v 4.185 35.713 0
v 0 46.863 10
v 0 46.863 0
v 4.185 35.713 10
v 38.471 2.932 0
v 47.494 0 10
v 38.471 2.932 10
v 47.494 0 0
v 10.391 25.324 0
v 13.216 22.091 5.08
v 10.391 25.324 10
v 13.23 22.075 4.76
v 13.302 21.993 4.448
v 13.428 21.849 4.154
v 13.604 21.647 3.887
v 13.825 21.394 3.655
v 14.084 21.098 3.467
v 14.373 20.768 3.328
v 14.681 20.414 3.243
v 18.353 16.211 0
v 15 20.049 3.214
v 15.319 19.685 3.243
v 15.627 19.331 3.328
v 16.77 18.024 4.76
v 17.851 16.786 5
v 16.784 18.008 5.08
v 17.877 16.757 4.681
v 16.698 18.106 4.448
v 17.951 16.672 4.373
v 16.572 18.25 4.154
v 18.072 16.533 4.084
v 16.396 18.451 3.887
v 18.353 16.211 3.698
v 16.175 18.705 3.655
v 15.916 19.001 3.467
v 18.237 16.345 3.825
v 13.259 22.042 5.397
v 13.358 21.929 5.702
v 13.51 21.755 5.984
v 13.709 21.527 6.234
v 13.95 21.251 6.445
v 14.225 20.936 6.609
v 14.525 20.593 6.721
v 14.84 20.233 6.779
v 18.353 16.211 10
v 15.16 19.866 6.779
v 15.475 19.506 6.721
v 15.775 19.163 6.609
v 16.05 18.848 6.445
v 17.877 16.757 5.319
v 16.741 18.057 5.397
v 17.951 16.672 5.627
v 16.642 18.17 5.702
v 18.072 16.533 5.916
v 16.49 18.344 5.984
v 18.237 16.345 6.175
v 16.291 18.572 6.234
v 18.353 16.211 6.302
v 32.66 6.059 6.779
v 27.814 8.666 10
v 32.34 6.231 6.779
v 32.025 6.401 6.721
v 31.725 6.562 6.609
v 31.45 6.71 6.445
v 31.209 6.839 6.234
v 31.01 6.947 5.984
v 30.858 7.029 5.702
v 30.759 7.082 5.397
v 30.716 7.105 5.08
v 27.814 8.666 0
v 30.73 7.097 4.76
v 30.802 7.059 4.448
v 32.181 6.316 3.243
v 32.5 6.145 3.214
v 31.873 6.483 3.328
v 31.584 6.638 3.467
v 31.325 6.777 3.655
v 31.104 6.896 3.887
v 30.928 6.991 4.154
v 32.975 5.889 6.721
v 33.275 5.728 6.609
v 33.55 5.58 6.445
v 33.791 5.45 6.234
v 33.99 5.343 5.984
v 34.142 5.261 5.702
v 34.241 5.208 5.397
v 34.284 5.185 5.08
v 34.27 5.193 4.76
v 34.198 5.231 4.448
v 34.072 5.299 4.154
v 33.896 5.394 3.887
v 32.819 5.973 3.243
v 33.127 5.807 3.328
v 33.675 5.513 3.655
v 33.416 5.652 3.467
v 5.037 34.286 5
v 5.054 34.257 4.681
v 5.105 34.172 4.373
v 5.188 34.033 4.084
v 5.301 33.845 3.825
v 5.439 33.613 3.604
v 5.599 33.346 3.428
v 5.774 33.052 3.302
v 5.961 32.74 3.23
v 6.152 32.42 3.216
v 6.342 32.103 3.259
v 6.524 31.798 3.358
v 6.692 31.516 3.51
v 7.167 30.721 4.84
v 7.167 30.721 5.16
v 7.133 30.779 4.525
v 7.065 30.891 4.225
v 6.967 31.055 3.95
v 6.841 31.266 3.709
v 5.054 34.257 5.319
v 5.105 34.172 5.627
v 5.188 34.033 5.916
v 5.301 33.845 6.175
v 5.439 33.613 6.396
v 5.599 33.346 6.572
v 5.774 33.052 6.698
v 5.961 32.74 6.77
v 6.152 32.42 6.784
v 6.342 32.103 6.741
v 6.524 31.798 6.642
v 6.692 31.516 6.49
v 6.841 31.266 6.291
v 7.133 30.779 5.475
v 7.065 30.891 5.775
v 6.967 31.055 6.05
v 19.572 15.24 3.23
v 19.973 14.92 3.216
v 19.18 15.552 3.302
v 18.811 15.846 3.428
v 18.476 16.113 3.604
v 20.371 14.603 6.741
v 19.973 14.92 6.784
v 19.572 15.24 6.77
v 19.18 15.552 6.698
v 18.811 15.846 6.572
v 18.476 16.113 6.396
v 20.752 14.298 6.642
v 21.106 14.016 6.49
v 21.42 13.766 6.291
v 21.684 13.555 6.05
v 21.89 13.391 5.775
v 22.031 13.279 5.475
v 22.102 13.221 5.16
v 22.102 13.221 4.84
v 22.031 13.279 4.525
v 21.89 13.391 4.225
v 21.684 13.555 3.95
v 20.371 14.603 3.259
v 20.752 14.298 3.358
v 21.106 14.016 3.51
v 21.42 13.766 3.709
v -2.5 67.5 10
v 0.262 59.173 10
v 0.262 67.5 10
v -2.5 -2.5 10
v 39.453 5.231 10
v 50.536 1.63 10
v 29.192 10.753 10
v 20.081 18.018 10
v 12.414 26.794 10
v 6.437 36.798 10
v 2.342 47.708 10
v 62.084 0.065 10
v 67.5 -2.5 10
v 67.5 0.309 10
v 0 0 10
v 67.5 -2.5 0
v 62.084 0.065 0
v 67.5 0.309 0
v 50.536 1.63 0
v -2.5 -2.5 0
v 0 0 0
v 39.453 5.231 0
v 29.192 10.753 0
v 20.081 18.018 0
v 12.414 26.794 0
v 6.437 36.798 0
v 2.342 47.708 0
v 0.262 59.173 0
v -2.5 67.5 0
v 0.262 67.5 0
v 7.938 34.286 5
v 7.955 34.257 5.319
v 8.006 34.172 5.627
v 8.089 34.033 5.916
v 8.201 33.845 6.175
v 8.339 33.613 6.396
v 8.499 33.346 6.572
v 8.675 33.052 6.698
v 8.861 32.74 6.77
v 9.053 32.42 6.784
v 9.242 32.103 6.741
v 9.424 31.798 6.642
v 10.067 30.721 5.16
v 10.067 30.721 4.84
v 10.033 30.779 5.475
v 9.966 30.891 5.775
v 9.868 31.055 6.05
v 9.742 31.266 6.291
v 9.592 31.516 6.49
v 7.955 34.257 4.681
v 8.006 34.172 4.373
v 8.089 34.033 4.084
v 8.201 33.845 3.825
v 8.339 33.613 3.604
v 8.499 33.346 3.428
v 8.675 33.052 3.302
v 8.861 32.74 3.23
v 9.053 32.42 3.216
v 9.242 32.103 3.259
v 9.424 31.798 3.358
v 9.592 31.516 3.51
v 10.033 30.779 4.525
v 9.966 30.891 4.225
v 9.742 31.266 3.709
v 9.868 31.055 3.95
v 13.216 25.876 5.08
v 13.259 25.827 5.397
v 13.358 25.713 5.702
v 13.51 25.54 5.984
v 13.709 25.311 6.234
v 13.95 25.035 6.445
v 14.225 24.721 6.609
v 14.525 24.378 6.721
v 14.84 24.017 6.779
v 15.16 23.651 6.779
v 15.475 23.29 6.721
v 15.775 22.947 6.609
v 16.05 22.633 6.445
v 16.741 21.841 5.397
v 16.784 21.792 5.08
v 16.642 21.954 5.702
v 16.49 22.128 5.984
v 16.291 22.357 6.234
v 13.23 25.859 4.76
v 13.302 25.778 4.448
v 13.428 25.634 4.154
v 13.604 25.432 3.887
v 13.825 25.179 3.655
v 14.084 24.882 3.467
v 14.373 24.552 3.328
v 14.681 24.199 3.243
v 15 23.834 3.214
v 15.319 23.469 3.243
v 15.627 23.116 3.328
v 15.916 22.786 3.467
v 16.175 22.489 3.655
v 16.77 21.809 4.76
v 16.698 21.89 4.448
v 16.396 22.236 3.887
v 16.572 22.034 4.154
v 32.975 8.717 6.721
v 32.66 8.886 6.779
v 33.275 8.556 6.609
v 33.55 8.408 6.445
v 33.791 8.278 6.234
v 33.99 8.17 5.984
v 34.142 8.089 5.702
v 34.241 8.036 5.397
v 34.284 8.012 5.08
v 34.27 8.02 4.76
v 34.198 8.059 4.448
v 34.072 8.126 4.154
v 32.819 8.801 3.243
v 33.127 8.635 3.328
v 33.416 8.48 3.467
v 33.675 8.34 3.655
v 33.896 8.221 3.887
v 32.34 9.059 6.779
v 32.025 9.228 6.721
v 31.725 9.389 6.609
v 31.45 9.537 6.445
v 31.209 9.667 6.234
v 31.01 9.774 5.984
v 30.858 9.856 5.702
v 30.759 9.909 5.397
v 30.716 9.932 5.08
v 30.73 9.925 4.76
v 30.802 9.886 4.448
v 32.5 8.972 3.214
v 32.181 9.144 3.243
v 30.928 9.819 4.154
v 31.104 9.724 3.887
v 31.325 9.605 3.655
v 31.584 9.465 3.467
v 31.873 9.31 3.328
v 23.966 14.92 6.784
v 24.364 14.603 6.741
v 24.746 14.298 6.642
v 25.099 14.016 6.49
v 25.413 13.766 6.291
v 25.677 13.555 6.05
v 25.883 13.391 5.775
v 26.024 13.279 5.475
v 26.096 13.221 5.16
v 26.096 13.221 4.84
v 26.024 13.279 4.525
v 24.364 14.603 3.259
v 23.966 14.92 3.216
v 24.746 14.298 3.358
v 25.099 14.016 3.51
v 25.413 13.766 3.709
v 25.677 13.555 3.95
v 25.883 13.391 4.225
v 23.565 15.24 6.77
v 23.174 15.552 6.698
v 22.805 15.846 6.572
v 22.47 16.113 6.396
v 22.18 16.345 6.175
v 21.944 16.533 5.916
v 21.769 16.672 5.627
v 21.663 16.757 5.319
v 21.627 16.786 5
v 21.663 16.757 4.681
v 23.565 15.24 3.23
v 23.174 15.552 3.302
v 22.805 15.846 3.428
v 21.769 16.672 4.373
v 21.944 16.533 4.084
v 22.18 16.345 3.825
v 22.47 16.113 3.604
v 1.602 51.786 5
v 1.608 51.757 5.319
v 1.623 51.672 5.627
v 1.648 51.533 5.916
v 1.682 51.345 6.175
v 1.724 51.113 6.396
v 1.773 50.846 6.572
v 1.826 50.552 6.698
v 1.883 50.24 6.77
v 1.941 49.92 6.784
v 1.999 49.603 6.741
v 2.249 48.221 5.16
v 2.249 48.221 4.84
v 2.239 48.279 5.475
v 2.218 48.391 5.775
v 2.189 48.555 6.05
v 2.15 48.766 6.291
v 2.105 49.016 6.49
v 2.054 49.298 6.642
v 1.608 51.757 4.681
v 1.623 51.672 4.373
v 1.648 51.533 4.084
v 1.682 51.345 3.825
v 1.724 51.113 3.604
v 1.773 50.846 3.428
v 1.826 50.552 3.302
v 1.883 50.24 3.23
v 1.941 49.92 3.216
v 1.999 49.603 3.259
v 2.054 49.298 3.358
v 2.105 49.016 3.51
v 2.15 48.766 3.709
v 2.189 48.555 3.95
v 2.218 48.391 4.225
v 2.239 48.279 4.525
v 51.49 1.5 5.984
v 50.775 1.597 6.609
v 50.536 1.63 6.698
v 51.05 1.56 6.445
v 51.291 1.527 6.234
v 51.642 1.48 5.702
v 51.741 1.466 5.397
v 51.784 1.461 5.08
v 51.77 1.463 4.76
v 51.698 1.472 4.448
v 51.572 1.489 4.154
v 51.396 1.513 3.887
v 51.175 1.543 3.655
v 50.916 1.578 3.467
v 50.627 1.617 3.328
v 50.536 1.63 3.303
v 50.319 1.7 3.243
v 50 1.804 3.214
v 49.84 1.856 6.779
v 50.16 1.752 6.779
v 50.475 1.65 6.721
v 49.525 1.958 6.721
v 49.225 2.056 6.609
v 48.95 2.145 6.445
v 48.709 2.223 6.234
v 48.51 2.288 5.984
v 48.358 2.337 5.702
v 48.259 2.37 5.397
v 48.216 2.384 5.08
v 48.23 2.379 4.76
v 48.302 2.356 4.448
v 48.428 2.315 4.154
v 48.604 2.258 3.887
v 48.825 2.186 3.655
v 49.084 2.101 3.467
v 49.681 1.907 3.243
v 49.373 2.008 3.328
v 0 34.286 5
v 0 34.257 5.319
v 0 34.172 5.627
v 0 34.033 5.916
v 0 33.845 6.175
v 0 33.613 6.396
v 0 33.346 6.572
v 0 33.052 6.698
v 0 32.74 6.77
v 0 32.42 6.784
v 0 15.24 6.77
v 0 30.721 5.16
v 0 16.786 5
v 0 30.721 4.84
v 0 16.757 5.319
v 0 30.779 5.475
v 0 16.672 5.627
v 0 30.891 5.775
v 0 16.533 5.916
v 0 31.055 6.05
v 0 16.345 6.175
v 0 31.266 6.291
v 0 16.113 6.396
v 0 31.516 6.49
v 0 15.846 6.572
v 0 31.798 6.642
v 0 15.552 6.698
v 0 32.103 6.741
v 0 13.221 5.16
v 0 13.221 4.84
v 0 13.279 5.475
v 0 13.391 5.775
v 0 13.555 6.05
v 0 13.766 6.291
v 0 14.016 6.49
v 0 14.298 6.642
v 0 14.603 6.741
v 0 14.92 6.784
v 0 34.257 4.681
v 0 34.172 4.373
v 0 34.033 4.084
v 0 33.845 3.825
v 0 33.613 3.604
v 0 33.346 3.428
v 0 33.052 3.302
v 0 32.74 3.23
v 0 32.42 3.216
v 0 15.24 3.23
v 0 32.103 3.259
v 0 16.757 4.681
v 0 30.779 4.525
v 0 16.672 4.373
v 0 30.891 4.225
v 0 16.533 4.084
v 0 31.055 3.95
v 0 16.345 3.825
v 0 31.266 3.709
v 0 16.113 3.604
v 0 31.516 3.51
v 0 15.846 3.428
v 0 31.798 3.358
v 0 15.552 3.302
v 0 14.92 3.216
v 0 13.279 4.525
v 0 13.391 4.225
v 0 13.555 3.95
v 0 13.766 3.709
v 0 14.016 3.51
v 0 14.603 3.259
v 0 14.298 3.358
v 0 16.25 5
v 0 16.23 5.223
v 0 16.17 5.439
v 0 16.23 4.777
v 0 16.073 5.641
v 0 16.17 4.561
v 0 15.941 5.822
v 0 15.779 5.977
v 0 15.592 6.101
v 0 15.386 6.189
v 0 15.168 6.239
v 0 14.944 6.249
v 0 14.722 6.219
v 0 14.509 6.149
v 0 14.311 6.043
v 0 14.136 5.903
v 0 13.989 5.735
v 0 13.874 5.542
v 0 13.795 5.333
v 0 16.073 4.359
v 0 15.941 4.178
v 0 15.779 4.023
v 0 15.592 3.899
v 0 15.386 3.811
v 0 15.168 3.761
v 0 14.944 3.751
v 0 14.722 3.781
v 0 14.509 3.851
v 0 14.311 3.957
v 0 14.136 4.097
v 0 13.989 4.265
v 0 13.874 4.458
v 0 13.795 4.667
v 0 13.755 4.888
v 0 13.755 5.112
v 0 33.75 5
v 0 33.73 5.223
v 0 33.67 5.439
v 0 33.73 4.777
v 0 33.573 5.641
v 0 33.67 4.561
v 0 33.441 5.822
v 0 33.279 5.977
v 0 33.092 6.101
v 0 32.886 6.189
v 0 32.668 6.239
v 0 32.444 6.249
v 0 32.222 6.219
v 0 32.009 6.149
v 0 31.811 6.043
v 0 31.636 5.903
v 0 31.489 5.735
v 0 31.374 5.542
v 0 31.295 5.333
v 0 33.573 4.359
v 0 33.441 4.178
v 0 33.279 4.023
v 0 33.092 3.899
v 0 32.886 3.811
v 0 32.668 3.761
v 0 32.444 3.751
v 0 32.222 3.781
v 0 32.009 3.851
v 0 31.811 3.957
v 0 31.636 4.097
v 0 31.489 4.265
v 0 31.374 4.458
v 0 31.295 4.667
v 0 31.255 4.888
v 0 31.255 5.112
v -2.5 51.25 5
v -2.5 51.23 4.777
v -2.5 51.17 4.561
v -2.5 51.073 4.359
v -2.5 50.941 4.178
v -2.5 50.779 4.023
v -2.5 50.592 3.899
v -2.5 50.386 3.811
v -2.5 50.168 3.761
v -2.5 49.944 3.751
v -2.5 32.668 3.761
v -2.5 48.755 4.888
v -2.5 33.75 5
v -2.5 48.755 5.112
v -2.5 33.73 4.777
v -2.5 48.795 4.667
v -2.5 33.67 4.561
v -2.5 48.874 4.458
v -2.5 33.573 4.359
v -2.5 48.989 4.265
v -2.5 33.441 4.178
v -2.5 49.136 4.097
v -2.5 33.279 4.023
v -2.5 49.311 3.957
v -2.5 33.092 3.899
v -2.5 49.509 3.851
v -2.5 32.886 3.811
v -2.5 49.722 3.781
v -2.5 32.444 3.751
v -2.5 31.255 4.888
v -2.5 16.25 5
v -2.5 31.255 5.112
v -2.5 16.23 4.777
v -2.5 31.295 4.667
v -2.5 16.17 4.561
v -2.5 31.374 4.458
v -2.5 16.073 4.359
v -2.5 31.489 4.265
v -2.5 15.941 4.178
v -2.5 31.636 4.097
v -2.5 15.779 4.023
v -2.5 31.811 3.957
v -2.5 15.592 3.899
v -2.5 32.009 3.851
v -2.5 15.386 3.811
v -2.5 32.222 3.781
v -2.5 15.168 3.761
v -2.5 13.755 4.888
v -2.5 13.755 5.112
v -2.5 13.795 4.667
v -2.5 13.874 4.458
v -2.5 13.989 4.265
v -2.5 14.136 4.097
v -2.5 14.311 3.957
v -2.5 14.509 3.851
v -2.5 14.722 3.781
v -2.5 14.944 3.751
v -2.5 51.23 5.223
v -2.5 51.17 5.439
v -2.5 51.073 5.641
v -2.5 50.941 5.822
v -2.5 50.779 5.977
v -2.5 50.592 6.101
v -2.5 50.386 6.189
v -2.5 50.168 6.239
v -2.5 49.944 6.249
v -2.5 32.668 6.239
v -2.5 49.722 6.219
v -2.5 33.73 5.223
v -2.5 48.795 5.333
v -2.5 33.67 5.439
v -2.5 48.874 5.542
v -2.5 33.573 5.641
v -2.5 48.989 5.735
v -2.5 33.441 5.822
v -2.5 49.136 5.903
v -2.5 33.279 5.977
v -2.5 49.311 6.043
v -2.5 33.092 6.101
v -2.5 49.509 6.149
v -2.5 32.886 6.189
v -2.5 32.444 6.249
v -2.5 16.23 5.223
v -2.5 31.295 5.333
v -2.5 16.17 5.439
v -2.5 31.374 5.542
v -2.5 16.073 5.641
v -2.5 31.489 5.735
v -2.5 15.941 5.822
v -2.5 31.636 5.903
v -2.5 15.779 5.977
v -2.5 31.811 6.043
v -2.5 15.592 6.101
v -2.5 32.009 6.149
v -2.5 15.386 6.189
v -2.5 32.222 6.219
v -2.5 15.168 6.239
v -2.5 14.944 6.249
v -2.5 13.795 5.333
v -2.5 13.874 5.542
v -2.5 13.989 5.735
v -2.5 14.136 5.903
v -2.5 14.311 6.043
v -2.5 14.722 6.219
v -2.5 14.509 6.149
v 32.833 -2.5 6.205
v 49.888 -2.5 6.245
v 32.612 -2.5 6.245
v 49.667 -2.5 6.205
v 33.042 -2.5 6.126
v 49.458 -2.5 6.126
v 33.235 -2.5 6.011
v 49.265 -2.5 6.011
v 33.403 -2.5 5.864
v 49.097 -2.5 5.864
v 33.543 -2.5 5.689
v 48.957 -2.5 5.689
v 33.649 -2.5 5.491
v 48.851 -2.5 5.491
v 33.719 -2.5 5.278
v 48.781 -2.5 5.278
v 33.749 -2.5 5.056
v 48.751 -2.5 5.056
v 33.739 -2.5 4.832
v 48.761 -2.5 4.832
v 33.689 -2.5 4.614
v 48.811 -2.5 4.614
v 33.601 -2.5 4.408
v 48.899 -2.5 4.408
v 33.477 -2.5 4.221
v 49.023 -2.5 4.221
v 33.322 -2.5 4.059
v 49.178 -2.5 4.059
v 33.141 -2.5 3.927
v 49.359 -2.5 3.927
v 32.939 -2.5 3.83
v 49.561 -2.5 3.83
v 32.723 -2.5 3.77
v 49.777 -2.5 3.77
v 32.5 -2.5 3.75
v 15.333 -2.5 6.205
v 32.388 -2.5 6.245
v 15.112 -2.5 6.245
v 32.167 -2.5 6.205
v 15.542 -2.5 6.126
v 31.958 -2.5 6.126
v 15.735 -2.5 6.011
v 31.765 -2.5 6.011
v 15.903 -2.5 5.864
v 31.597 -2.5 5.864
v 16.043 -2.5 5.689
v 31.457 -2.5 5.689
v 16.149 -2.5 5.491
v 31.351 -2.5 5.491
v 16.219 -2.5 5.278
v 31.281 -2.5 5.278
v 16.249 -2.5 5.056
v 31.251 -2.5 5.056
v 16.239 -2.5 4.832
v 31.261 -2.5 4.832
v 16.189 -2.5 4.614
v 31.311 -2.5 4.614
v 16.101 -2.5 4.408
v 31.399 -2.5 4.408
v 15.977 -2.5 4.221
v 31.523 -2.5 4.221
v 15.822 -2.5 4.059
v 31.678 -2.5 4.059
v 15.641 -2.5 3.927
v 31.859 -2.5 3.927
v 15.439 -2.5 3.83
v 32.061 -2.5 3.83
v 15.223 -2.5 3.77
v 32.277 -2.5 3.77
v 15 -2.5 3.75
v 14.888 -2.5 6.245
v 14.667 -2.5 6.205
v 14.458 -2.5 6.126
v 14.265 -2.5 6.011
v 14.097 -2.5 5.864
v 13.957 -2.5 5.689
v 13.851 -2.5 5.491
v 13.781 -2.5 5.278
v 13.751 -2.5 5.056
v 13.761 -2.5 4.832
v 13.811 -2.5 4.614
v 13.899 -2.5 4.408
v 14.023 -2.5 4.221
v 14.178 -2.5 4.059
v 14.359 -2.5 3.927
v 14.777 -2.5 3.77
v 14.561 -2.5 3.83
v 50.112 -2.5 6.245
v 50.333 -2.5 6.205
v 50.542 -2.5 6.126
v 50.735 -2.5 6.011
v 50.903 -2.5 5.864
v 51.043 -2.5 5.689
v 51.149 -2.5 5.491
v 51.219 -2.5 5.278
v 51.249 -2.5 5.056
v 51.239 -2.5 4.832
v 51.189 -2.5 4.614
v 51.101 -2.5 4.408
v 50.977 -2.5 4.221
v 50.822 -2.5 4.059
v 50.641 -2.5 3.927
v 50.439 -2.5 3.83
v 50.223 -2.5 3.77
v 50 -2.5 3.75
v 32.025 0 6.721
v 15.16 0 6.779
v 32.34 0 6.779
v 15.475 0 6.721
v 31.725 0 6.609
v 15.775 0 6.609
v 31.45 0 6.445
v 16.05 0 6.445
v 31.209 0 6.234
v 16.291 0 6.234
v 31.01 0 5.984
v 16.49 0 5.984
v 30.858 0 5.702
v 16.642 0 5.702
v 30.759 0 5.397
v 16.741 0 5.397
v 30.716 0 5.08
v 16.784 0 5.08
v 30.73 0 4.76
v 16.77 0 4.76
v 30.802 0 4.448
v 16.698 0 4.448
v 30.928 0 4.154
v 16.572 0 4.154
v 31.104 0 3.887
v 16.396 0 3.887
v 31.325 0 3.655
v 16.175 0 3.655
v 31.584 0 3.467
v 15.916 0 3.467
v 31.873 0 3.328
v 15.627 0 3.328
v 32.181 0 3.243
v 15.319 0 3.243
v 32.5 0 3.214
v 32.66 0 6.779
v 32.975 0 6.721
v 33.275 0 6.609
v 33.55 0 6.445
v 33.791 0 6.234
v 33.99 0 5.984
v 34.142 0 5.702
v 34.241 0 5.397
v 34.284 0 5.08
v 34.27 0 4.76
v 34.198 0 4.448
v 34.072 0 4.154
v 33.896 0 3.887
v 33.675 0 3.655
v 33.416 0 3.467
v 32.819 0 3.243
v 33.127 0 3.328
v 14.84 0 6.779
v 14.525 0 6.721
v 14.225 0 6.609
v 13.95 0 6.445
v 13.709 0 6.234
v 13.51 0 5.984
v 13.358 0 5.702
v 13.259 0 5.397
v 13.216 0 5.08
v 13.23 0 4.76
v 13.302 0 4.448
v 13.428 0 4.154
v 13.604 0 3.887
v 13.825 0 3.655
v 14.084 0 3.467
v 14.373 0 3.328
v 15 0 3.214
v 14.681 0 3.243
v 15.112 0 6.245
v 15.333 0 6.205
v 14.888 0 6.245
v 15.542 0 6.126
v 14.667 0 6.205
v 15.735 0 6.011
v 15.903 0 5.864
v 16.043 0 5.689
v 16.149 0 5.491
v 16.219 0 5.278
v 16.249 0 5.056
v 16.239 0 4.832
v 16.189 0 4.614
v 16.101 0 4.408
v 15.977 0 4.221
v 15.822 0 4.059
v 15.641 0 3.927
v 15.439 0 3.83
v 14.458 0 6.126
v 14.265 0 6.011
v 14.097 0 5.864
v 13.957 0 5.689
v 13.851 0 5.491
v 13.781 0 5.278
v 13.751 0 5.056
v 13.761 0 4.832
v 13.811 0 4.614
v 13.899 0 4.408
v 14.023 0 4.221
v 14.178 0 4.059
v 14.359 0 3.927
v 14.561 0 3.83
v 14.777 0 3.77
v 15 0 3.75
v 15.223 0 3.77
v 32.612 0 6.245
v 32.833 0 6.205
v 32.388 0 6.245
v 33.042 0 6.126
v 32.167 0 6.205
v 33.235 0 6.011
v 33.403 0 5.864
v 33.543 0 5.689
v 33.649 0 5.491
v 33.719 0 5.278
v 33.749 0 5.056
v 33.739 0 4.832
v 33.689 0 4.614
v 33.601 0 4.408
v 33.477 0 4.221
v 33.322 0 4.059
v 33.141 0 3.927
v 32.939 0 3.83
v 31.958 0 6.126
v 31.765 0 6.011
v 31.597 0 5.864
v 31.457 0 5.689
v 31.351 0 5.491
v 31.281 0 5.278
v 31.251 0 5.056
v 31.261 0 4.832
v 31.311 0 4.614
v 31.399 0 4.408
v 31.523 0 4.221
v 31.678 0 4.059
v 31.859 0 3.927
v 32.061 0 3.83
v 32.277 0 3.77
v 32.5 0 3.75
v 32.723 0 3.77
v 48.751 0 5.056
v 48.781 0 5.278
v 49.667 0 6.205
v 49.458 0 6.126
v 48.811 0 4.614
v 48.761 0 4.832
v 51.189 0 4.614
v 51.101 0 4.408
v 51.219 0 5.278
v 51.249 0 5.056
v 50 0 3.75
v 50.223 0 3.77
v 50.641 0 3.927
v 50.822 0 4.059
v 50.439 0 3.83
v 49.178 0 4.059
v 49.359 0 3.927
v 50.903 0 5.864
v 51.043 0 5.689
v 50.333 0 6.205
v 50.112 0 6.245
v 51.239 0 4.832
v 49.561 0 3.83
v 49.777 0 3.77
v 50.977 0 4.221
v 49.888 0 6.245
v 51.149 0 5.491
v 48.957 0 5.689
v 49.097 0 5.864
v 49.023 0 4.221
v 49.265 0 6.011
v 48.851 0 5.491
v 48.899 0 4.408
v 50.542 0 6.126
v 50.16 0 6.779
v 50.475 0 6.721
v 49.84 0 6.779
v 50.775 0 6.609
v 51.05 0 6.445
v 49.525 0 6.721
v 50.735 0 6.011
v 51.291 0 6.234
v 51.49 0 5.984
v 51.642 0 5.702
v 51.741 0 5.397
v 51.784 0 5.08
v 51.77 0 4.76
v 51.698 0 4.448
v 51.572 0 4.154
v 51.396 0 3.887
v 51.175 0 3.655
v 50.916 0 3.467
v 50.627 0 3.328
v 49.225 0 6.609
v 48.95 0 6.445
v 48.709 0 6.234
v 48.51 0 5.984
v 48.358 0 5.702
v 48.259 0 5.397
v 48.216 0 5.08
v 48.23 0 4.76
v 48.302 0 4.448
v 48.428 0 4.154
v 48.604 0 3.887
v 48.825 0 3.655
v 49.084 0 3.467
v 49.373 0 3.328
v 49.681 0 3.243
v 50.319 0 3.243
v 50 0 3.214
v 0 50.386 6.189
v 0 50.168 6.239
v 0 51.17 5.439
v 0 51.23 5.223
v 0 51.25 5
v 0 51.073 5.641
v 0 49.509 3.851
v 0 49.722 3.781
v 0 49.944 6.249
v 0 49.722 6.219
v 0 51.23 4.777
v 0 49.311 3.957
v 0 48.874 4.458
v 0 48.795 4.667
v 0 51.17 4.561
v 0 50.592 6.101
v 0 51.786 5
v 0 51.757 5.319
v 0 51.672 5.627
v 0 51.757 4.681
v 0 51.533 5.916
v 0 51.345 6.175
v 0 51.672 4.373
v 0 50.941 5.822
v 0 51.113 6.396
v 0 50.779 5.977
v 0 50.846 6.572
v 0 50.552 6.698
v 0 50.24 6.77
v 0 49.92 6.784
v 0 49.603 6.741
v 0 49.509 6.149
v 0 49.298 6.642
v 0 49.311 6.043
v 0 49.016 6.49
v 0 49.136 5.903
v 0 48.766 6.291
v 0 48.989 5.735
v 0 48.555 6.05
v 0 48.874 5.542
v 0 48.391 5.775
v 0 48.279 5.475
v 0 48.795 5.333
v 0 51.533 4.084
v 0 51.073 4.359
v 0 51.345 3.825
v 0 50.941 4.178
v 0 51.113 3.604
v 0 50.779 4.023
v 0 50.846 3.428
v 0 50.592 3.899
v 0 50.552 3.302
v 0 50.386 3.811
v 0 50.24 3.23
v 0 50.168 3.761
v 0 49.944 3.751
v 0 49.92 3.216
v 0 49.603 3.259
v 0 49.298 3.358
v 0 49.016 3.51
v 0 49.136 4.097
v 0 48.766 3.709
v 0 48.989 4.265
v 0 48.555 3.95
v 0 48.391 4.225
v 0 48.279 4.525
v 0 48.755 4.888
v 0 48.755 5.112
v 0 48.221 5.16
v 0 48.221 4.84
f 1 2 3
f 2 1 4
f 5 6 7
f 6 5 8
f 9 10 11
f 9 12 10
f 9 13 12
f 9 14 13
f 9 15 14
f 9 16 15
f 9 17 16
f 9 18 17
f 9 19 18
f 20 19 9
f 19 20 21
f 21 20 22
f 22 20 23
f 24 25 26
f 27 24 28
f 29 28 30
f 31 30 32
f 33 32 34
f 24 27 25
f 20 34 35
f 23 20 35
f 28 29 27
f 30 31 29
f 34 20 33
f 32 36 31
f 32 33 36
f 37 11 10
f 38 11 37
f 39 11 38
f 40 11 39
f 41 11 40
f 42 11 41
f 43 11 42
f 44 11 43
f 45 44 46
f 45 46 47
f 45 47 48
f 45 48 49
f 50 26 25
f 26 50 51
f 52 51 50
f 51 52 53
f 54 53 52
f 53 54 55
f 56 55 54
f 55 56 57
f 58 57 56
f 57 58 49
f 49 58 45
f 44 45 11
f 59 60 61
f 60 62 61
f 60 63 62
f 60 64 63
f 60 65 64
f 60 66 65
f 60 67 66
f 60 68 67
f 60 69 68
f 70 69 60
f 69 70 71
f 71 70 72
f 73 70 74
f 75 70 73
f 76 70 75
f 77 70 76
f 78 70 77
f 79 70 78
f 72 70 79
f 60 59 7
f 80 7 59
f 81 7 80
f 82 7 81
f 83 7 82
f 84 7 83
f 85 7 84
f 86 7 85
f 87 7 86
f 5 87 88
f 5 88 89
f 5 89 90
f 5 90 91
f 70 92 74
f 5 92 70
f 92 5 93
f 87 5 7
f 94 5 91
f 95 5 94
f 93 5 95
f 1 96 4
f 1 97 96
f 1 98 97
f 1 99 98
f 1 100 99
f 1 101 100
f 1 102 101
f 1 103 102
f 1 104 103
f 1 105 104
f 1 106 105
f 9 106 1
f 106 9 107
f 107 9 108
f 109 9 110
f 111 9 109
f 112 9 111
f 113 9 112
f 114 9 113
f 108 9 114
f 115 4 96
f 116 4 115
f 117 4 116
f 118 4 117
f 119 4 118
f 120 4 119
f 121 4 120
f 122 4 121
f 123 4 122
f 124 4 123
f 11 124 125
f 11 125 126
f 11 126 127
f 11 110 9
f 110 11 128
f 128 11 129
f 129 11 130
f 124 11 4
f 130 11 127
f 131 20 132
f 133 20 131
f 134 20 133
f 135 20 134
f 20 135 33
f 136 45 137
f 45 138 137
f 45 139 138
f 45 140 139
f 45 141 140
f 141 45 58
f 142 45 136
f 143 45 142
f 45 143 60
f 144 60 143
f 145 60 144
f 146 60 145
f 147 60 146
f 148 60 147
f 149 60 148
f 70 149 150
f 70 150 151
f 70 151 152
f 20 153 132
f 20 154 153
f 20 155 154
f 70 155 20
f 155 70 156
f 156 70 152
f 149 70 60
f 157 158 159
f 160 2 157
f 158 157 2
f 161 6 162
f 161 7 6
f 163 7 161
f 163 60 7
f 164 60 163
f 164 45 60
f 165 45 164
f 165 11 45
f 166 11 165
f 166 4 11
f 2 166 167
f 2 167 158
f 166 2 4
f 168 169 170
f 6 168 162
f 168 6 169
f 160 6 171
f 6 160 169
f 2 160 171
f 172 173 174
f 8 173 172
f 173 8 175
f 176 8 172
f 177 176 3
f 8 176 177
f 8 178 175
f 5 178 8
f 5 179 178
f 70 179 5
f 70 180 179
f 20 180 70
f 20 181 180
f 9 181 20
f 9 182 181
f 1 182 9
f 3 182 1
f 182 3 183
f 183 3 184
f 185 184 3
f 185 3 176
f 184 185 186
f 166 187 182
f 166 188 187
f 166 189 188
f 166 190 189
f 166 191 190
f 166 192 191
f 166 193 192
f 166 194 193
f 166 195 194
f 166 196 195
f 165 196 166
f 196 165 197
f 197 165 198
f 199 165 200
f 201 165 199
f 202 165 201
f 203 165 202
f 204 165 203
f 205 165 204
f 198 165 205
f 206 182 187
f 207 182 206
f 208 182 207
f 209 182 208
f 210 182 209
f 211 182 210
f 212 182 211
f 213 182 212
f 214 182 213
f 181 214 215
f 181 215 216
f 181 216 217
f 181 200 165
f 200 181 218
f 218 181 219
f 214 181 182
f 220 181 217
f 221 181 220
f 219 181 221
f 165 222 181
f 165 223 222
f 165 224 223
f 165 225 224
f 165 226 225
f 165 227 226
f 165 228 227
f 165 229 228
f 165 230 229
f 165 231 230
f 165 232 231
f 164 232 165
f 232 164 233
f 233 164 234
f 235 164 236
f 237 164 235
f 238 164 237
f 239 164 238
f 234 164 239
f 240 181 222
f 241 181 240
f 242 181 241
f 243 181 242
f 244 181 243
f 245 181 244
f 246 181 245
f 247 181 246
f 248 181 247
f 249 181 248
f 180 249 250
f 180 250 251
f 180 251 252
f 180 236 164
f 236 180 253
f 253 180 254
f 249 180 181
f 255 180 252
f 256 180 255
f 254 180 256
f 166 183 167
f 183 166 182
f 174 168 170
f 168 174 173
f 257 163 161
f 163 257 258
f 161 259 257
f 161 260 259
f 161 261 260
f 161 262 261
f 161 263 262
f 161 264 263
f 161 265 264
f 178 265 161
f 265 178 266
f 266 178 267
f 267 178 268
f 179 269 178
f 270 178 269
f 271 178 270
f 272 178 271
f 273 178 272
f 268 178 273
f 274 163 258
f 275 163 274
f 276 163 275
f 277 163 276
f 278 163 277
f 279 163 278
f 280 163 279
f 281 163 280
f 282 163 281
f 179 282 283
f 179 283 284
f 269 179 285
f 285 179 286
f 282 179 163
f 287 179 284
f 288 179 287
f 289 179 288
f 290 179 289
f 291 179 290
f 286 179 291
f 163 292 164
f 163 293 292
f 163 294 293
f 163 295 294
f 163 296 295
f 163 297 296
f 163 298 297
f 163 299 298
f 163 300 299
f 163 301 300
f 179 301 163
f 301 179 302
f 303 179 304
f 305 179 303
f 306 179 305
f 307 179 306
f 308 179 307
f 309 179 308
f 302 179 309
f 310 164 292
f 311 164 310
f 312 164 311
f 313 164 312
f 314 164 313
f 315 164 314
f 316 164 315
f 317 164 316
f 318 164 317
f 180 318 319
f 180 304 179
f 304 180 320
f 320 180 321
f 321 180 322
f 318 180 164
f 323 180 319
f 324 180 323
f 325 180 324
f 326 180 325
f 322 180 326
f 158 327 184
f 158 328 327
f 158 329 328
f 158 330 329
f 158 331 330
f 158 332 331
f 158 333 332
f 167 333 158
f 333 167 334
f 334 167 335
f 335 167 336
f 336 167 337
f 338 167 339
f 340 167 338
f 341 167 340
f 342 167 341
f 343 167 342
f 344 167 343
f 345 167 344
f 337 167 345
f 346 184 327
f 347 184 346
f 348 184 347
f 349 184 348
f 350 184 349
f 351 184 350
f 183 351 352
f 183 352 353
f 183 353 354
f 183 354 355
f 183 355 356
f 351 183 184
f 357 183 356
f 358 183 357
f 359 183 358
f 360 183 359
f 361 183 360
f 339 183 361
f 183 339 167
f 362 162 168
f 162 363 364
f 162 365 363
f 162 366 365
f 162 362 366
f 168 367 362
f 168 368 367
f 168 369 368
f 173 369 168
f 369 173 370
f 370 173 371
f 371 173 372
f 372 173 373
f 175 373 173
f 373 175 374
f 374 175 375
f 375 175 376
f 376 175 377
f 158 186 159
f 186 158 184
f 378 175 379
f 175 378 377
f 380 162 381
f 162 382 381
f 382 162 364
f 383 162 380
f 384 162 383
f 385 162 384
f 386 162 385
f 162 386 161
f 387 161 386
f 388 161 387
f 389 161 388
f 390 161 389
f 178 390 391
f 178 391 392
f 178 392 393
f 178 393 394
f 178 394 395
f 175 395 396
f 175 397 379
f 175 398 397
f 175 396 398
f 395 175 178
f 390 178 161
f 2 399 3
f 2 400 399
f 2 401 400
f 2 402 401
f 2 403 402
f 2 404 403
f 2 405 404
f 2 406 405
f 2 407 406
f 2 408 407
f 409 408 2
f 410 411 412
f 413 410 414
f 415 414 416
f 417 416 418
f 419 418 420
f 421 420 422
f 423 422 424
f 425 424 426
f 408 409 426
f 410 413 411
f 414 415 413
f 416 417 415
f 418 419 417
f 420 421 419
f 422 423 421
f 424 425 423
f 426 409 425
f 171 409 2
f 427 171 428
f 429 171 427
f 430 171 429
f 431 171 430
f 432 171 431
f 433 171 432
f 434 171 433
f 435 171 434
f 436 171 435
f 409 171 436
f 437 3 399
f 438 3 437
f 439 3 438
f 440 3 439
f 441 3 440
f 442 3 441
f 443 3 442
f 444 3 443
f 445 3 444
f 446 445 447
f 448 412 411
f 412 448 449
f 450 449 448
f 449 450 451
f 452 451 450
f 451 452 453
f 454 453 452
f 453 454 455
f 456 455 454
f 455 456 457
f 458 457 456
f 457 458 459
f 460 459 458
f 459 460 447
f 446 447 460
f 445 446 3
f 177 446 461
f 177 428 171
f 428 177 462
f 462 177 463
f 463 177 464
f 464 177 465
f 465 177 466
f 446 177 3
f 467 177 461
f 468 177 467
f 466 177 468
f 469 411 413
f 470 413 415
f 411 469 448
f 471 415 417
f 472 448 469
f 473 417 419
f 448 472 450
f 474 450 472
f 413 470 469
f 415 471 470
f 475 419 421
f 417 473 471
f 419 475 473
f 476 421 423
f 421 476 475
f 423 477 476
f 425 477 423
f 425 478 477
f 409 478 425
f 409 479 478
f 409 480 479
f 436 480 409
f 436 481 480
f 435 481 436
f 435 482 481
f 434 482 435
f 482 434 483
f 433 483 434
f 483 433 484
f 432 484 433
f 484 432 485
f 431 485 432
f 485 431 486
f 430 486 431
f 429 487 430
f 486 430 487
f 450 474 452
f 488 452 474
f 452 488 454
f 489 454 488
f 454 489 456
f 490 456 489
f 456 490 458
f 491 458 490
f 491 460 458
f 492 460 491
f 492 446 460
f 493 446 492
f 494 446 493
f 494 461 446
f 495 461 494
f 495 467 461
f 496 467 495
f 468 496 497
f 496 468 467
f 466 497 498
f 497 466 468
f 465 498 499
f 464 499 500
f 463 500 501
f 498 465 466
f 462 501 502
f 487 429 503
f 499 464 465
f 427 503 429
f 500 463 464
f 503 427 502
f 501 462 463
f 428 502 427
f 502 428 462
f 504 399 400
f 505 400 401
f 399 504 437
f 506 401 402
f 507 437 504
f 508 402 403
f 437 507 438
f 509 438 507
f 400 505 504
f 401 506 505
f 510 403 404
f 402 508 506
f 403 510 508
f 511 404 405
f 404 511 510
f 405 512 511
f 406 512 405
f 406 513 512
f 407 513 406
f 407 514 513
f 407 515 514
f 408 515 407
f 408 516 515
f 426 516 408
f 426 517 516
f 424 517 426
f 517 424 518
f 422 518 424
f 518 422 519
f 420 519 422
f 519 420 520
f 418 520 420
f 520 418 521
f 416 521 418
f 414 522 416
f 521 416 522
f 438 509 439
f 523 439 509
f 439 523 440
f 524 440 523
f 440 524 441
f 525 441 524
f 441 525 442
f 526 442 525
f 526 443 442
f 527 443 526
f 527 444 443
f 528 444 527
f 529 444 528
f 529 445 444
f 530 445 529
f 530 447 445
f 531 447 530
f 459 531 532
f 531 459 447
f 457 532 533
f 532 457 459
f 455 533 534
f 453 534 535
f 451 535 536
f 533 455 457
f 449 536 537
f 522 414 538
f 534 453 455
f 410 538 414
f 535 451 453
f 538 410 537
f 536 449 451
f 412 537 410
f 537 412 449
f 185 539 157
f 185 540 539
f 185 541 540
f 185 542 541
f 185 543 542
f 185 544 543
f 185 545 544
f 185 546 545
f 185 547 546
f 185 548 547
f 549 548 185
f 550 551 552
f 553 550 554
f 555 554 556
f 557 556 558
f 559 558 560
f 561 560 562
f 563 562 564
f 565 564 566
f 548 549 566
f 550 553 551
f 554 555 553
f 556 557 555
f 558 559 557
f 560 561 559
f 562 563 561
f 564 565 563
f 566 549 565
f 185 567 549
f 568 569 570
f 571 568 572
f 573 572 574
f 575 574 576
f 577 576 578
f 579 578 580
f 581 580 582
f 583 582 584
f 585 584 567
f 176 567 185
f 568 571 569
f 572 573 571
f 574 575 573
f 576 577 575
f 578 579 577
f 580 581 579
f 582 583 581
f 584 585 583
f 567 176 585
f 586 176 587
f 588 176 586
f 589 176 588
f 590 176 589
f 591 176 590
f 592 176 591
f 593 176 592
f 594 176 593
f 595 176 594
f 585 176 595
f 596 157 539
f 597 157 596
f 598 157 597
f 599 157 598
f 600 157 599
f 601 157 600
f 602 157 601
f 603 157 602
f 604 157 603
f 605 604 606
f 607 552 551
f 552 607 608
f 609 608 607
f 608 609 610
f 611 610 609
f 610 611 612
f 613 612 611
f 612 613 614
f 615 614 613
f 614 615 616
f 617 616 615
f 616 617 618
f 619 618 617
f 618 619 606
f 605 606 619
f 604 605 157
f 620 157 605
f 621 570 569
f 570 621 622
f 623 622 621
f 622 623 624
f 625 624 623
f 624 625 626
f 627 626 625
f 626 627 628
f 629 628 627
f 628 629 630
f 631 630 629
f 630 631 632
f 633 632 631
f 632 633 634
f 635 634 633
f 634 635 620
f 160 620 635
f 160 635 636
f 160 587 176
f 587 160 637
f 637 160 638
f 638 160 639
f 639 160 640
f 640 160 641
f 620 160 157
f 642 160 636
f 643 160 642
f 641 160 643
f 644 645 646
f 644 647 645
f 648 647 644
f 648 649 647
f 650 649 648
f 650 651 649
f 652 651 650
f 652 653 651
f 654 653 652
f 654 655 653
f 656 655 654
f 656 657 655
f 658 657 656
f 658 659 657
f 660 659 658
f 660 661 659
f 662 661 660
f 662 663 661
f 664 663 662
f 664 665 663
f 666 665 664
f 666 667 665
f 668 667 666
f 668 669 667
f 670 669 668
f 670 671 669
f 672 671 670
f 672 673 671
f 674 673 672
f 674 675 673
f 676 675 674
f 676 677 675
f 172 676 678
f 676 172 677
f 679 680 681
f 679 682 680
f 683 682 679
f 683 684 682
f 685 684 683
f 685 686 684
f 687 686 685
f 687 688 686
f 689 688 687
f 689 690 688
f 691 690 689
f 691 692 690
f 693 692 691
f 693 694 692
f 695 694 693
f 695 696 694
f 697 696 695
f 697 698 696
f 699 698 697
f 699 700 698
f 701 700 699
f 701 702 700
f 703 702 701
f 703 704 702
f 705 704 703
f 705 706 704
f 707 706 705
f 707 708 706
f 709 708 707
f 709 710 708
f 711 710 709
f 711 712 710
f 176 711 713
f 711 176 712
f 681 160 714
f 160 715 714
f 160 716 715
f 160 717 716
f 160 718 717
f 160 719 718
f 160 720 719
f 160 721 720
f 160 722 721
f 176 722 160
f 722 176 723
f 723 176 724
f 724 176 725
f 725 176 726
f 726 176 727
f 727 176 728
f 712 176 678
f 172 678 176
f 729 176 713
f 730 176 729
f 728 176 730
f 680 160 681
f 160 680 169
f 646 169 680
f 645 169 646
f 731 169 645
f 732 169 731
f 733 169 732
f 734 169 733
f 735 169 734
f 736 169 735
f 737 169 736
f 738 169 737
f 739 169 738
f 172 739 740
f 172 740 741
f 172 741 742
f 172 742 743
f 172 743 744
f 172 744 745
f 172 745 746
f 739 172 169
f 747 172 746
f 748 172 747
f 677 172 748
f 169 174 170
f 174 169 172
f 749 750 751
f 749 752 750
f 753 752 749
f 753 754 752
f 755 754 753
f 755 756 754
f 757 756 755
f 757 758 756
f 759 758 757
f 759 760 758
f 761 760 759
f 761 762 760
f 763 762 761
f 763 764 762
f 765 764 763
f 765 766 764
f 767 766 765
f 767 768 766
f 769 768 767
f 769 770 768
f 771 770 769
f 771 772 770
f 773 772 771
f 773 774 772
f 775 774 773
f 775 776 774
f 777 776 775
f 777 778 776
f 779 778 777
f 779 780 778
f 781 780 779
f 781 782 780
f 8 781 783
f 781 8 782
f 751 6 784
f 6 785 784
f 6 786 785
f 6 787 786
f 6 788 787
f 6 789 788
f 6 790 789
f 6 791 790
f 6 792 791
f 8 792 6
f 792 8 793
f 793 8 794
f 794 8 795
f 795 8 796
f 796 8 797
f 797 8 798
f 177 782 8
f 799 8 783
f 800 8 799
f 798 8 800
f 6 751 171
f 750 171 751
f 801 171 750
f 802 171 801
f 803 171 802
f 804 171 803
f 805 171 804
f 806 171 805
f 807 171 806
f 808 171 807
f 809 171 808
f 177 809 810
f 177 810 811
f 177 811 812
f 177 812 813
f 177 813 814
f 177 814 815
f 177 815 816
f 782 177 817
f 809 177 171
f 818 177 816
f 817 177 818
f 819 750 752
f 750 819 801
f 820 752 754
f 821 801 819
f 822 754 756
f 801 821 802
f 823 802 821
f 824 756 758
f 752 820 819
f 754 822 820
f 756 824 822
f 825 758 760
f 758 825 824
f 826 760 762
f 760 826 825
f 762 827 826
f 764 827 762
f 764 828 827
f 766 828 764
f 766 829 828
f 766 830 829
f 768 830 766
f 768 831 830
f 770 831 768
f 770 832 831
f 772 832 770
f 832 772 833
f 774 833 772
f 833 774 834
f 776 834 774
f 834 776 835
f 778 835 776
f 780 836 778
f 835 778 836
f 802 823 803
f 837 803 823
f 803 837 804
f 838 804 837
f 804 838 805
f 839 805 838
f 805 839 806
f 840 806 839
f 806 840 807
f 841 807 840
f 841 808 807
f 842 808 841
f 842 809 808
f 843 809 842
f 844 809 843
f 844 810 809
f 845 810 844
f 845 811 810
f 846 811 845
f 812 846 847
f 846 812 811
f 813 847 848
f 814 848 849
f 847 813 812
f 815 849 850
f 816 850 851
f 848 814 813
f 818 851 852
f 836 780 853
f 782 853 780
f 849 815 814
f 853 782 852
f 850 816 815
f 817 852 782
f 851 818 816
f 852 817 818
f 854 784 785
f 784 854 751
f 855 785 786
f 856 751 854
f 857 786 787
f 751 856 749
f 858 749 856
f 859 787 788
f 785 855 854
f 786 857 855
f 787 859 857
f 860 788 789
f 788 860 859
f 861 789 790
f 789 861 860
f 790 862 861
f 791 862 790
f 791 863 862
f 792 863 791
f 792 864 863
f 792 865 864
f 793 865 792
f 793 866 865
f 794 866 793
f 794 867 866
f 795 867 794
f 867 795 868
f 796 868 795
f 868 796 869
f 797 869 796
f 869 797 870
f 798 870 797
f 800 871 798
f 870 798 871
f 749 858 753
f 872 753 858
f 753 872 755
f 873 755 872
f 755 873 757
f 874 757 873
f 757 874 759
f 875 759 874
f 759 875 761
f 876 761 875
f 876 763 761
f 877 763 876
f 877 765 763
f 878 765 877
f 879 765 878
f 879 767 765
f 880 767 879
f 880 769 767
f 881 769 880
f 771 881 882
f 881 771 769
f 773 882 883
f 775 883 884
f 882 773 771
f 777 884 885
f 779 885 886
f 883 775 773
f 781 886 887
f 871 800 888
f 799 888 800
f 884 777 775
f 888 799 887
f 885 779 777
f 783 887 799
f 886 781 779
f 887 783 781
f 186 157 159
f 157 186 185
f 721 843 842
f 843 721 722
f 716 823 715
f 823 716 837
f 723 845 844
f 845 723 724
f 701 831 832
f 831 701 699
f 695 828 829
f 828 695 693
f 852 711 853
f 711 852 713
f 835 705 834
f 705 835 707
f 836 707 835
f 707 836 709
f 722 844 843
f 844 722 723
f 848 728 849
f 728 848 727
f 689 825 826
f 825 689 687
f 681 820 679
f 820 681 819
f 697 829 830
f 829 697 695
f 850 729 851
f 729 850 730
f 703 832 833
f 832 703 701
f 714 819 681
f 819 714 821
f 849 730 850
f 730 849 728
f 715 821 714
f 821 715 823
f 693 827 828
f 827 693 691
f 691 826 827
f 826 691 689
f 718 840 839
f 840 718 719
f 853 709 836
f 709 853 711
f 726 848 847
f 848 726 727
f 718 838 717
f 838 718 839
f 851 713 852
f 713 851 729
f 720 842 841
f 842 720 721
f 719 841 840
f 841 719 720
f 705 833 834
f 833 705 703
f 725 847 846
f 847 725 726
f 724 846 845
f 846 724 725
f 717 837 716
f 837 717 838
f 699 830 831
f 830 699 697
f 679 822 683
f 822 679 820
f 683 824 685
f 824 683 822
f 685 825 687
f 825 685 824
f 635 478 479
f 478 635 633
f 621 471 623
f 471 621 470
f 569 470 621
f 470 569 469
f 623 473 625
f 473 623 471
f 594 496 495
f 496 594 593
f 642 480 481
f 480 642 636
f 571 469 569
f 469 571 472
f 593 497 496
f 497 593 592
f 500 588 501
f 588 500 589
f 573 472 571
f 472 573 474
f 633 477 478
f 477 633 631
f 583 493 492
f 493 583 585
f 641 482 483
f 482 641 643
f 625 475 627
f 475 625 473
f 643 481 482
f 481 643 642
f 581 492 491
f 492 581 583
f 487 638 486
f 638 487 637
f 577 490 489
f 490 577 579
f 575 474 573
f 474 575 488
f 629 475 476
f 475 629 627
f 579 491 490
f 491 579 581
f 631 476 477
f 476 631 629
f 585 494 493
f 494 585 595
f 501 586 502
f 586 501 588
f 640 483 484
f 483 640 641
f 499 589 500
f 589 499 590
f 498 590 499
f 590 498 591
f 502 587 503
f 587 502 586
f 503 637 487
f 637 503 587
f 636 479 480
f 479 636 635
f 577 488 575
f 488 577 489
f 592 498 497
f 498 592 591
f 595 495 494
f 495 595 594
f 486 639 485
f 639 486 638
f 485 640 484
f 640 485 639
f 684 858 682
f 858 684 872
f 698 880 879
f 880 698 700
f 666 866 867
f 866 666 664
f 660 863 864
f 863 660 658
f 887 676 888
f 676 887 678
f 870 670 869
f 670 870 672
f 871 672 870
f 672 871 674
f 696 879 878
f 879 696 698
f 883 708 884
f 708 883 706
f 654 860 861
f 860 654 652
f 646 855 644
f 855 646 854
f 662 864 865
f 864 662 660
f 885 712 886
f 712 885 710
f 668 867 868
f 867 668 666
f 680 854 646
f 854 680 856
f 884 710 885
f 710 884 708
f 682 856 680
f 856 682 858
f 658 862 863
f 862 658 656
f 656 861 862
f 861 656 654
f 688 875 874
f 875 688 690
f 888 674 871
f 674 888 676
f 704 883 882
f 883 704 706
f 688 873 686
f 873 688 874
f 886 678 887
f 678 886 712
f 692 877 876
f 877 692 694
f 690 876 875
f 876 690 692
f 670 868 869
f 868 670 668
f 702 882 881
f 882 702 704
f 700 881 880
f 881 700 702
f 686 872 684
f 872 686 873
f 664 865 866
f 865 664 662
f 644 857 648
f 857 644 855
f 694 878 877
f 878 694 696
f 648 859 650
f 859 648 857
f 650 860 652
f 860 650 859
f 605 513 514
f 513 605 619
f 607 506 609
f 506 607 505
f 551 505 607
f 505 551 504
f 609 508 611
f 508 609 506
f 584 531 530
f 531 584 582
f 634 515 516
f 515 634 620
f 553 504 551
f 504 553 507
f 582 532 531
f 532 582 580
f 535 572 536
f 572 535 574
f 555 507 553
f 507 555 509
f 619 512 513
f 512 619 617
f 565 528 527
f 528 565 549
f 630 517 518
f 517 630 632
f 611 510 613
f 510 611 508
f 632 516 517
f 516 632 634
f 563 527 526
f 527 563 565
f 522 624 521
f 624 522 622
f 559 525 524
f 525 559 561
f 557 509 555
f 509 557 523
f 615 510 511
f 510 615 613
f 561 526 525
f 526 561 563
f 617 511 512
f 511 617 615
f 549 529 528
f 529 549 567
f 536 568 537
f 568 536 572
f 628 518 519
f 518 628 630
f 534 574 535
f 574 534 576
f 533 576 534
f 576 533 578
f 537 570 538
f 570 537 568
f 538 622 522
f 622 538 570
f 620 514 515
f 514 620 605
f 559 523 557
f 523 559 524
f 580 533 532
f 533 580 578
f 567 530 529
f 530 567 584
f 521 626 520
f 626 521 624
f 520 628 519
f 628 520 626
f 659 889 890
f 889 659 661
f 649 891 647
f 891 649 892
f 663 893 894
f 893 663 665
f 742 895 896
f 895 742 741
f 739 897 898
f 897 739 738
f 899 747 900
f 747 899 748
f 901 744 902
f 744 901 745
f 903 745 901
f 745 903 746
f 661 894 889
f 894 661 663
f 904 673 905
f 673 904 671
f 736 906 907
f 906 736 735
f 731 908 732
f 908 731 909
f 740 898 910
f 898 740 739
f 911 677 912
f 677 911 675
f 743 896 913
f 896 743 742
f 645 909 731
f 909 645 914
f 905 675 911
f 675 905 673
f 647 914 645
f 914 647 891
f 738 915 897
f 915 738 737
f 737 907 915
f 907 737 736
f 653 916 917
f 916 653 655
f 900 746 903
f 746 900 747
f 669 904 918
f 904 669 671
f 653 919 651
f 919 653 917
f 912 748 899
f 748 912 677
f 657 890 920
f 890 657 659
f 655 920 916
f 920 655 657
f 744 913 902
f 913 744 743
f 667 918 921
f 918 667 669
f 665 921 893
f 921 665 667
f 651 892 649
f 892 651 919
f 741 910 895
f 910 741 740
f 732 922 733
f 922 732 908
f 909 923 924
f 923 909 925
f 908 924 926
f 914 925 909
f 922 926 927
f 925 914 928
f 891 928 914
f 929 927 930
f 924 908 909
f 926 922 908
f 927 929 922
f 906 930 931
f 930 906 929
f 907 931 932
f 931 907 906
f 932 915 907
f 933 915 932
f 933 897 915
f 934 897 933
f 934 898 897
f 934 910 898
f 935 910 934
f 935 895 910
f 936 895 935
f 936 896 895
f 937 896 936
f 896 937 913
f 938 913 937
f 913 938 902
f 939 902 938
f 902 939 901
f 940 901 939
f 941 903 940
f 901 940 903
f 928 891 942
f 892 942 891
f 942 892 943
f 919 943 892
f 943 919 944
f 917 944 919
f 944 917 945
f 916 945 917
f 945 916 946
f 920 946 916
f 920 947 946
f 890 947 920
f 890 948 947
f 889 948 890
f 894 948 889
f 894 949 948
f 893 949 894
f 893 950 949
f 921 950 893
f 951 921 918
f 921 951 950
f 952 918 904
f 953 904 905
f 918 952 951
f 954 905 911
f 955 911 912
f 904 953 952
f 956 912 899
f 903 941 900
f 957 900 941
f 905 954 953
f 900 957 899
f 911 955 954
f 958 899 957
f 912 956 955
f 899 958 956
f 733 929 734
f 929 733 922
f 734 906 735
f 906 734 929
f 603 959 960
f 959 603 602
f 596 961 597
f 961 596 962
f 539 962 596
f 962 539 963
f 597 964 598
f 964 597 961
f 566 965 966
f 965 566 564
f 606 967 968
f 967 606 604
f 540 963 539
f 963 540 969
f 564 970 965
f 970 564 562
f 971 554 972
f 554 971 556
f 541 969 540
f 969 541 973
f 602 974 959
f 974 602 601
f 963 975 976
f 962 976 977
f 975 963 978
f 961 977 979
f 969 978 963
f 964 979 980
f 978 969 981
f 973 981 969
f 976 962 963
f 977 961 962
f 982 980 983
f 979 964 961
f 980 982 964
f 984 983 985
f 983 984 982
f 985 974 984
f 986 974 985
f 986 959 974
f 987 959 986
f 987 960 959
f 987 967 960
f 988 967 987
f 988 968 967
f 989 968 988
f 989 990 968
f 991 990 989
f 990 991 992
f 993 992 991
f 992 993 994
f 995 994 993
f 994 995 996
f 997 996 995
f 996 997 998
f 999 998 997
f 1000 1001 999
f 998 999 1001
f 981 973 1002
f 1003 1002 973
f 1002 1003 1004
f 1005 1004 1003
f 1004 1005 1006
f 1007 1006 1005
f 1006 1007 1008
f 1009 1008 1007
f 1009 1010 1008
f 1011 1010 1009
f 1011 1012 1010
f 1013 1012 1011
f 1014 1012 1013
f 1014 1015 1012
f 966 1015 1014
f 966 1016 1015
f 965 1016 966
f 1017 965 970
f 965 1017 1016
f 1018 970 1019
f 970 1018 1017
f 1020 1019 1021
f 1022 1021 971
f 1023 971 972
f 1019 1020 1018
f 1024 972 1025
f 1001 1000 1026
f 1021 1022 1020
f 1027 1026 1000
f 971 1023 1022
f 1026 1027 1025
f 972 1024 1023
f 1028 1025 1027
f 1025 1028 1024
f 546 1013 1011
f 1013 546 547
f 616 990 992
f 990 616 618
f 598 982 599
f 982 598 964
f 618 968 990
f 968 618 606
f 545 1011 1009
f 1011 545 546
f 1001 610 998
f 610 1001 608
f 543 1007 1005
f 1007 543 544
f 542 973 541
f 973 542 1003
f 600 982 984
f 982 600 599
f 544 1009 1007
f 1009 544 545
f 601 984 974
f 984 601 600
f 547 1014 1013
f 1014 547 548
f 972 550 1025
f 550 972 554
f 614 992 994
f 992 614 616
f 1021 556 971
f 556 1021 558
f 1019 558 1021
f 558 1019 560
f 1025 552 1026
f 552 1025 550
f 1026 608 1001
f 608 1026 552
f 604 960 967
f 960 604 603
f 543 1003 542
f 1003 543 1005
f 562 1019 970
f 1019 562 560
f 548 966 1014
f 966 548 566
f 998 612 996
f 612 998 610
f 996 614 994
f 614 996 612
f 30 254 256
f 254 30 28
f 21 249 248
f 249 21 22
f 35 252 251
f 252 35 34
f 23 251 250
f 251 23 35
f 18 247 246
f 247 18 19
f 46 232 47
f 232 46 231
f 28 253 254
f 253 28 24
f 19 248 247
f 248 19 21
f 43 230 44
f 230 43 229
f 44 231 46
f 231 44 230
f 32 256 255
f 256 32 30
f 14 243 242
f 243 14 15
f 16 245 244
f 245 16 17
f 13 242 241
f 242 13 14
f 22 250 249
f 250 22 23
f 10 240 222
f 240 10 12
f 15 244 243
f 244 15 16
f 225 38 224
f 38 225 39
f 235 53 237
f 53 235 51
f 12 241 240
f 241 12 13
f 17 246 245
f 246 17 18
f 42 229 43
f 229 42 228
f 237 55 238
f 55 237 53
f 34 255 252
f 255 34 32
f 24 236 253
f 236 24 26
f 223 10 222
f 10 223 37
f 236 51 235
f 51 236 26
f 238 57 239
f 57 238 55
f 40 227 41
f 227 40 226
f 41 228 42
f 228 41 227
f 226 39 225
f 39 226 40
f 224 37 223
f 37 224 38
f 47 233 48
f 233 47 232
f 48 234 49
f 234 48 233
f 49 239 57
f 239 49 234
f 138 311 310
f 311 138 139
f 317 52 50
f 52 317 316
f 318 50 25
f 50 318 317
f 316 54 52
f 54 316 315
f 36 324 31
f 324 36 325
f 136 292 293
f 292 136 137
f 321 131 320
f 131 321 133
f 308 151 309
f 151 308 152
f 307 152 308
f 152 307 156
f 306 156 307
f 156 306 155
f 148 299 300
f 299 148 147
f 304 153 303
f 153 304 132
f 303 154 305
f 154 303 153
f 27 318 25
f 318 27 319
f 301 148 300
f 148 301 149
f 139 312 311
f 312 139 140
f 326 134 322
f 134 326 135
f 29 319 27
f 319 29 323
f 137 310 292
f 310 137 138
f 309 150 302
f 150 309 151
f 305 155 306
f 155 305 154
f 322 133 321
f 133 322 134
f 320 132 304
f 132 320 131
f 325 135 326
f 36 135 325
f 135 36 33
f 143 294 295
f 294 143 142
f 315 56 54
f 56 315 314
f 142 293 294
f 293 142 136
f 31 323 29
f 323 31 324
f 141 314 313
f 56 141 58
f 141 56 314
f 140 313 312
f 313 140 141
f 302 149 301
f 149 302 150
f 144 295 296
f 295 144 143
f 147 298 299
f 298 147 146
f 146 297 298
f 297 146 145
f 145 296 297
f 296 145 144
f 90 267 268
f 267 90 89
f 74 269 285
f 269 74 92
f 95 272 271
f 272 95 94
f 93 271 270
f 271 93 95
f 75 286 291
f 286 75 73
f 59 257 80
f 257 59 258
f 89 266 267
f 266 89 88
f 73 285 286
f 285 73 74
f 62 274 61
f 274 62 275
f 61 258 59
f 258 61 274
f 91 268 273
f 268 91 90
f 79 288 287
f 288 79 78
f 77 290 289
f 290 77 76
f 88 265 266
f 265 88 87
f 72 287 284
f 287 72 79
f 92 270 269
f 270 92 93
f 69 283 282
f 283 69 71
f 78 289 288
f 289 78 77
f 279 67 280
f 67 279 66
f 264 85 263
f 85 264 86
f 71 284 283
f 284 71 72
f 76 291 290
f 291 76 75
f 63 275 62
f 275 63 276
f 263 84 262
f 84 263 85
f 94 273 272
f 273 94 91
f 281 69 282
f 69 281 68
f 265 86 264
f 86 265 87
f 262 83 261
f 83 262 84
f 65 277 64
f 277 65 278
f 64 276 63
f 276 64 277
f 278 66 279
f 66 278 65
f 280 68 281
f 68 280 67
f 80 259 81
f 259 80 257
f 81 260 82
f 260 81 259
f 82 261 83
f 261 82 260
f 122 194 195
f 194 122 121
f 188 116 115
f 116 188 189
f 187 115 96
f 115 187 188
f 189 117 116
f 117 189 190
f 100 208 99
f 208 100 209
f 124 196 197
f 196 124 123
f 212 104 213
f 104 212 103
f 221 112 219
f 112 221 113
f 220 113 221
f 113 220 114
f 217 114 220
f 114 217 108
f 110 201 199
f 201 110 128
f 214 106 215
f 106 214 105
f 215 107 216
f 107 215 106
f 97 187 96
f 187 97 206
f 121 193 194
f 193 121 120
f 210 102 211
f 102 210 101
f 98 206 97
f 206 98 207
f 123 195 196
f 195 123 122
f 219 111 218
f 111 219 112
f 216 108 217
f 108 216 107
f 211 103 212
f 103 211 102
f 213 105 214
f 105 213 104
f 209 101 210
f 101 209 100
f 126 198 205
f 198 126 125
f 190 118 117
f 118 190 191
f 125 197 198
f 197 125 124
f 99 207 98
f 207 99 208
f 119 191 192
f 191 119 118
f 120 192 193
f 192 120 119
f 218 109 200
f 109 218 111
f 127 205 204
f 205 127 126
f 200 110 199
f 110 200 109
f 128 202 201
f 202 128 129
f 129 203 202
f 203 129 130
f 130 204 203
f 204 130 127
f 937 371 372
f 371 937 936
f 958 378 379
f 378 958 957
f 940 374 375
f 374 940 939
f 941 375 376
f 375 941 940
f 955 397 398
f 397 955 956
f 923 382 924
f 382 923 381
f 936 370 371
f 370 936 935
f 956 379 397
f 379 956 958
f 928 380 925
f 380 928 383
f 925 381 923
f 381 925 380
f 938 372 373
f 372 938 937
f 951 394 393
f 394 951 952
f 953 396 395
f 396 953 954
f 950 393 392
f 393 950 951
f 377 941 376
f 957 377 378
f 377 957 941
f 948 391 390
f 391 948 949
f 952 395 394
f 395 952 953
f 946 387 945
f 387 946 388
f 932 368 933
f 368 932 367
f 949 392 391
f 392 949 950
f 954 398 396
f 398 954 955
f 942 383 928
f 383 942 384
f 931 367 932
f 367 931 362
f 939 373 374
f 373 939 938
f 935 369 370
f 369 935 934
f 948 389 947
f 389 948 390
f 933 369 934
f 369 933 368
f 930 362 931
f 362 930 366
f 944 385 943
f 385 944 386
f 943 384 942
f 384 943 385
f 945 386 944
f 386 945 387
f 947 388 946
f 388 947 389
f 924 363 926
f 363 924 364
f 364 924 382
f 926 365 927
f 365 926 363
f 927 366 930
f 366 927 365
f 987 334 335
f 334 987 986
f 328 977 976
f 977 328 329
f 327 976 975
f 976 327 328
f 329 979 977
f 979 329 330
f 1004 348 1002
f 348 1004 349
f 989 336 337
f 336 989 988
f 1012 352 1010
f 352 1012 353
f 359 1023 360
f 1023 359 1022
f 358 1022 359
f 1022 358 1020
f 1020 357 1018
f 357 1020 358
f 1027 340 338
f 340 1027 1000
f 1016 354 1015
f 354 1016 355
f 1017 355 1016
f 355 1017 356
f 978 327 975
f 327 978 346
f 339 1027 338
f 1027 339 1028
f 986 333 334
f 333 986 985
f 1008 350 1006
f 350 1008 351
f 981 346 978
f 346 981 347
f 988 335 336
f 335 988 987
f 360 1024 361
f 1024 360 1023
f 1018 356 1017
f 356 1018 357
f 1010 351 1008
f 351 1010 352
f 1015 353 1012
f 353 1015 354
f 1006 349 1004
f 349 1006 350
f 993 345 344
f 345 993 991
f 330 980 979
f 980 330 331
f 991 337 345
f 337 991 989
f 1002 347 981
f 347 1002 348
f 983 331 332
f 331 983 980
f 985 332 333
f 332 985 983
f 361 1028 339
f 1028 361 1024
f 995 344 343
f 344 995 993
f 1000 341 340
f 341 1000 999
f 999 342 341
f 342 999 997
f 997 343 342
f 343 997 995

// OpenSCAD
//length of bracket
length = 70;		
//width of bracket	
width = 10;		
//thickness 
thickness = 2.5;	
//number of holes
holecount=3;	
//hole diameter
holediameter=2.5;
//Make outer holes (1=true 0=false)
outers=1;

module Bracket(l,w,t) {
$fn=35;
intersection(){
	difference() {
		union() {
			translate([-t,-t,0]) cube( size=[t,t+1,w]);
			translate([0,-t,0]) cube( size=[l,t,w]);
			rotate ([0,0,90]) cube( size=[l,t,w]);
			translate ([l-t,l-t,0]) hoop(l,w,t);
			}
		smallholes();
		if (outers) largeholes();
		}
	translate([-t,-t,-1]) cube ( size=[l+t,l+t,w+2]); //cylinder(h=w+2,r1=l,r2=l);
	
	}
}

module hoop(l,w,t) {
n=20;
difference(){
			cylinder(h=w,r1=l,r2=l) ;
			cylinder(h=w,r1=l-t,r2=l-t) ;
		}
}

module smallholes() {
	n=length/(holecount+1);
   for (i=[0:holecount-1]) {
		//x axis
		translate ([n-thickness+i*n,0,width/2]) rotate(a=[90,90,0]) cylinder(h=thickness+1,r1=holediameter/2,r2=holediameter/2);
		// y axis		
		translate ([-thickness,n-thickness+i*n,width/2]) rotate([90,0,90]) cylinder(h=thickness,r1=holediameter/2,r2=holediameter/2);		

	}

}
module largeholes() {
	lhm=1.4; //large hole factor
	n=length/(holecount+1);
   for (i=[0:holecount-1]) {
		//x axis
		translate ([n-thickness+i*n,length,width/2]) rotate(a=[90,90,0]) cylinder(h=length,r1=holediameter/lhm,r2=holediameter/lhm);
		// y axis		
		translate ([0,n-thickness+i*n,width/2]) rotate([90,0,90]) cylinder(h=length,r1=holediameter/lhm,r2=holediameter/lhm);		
	}

}


Bracket(length-thickness,width,thickness);
